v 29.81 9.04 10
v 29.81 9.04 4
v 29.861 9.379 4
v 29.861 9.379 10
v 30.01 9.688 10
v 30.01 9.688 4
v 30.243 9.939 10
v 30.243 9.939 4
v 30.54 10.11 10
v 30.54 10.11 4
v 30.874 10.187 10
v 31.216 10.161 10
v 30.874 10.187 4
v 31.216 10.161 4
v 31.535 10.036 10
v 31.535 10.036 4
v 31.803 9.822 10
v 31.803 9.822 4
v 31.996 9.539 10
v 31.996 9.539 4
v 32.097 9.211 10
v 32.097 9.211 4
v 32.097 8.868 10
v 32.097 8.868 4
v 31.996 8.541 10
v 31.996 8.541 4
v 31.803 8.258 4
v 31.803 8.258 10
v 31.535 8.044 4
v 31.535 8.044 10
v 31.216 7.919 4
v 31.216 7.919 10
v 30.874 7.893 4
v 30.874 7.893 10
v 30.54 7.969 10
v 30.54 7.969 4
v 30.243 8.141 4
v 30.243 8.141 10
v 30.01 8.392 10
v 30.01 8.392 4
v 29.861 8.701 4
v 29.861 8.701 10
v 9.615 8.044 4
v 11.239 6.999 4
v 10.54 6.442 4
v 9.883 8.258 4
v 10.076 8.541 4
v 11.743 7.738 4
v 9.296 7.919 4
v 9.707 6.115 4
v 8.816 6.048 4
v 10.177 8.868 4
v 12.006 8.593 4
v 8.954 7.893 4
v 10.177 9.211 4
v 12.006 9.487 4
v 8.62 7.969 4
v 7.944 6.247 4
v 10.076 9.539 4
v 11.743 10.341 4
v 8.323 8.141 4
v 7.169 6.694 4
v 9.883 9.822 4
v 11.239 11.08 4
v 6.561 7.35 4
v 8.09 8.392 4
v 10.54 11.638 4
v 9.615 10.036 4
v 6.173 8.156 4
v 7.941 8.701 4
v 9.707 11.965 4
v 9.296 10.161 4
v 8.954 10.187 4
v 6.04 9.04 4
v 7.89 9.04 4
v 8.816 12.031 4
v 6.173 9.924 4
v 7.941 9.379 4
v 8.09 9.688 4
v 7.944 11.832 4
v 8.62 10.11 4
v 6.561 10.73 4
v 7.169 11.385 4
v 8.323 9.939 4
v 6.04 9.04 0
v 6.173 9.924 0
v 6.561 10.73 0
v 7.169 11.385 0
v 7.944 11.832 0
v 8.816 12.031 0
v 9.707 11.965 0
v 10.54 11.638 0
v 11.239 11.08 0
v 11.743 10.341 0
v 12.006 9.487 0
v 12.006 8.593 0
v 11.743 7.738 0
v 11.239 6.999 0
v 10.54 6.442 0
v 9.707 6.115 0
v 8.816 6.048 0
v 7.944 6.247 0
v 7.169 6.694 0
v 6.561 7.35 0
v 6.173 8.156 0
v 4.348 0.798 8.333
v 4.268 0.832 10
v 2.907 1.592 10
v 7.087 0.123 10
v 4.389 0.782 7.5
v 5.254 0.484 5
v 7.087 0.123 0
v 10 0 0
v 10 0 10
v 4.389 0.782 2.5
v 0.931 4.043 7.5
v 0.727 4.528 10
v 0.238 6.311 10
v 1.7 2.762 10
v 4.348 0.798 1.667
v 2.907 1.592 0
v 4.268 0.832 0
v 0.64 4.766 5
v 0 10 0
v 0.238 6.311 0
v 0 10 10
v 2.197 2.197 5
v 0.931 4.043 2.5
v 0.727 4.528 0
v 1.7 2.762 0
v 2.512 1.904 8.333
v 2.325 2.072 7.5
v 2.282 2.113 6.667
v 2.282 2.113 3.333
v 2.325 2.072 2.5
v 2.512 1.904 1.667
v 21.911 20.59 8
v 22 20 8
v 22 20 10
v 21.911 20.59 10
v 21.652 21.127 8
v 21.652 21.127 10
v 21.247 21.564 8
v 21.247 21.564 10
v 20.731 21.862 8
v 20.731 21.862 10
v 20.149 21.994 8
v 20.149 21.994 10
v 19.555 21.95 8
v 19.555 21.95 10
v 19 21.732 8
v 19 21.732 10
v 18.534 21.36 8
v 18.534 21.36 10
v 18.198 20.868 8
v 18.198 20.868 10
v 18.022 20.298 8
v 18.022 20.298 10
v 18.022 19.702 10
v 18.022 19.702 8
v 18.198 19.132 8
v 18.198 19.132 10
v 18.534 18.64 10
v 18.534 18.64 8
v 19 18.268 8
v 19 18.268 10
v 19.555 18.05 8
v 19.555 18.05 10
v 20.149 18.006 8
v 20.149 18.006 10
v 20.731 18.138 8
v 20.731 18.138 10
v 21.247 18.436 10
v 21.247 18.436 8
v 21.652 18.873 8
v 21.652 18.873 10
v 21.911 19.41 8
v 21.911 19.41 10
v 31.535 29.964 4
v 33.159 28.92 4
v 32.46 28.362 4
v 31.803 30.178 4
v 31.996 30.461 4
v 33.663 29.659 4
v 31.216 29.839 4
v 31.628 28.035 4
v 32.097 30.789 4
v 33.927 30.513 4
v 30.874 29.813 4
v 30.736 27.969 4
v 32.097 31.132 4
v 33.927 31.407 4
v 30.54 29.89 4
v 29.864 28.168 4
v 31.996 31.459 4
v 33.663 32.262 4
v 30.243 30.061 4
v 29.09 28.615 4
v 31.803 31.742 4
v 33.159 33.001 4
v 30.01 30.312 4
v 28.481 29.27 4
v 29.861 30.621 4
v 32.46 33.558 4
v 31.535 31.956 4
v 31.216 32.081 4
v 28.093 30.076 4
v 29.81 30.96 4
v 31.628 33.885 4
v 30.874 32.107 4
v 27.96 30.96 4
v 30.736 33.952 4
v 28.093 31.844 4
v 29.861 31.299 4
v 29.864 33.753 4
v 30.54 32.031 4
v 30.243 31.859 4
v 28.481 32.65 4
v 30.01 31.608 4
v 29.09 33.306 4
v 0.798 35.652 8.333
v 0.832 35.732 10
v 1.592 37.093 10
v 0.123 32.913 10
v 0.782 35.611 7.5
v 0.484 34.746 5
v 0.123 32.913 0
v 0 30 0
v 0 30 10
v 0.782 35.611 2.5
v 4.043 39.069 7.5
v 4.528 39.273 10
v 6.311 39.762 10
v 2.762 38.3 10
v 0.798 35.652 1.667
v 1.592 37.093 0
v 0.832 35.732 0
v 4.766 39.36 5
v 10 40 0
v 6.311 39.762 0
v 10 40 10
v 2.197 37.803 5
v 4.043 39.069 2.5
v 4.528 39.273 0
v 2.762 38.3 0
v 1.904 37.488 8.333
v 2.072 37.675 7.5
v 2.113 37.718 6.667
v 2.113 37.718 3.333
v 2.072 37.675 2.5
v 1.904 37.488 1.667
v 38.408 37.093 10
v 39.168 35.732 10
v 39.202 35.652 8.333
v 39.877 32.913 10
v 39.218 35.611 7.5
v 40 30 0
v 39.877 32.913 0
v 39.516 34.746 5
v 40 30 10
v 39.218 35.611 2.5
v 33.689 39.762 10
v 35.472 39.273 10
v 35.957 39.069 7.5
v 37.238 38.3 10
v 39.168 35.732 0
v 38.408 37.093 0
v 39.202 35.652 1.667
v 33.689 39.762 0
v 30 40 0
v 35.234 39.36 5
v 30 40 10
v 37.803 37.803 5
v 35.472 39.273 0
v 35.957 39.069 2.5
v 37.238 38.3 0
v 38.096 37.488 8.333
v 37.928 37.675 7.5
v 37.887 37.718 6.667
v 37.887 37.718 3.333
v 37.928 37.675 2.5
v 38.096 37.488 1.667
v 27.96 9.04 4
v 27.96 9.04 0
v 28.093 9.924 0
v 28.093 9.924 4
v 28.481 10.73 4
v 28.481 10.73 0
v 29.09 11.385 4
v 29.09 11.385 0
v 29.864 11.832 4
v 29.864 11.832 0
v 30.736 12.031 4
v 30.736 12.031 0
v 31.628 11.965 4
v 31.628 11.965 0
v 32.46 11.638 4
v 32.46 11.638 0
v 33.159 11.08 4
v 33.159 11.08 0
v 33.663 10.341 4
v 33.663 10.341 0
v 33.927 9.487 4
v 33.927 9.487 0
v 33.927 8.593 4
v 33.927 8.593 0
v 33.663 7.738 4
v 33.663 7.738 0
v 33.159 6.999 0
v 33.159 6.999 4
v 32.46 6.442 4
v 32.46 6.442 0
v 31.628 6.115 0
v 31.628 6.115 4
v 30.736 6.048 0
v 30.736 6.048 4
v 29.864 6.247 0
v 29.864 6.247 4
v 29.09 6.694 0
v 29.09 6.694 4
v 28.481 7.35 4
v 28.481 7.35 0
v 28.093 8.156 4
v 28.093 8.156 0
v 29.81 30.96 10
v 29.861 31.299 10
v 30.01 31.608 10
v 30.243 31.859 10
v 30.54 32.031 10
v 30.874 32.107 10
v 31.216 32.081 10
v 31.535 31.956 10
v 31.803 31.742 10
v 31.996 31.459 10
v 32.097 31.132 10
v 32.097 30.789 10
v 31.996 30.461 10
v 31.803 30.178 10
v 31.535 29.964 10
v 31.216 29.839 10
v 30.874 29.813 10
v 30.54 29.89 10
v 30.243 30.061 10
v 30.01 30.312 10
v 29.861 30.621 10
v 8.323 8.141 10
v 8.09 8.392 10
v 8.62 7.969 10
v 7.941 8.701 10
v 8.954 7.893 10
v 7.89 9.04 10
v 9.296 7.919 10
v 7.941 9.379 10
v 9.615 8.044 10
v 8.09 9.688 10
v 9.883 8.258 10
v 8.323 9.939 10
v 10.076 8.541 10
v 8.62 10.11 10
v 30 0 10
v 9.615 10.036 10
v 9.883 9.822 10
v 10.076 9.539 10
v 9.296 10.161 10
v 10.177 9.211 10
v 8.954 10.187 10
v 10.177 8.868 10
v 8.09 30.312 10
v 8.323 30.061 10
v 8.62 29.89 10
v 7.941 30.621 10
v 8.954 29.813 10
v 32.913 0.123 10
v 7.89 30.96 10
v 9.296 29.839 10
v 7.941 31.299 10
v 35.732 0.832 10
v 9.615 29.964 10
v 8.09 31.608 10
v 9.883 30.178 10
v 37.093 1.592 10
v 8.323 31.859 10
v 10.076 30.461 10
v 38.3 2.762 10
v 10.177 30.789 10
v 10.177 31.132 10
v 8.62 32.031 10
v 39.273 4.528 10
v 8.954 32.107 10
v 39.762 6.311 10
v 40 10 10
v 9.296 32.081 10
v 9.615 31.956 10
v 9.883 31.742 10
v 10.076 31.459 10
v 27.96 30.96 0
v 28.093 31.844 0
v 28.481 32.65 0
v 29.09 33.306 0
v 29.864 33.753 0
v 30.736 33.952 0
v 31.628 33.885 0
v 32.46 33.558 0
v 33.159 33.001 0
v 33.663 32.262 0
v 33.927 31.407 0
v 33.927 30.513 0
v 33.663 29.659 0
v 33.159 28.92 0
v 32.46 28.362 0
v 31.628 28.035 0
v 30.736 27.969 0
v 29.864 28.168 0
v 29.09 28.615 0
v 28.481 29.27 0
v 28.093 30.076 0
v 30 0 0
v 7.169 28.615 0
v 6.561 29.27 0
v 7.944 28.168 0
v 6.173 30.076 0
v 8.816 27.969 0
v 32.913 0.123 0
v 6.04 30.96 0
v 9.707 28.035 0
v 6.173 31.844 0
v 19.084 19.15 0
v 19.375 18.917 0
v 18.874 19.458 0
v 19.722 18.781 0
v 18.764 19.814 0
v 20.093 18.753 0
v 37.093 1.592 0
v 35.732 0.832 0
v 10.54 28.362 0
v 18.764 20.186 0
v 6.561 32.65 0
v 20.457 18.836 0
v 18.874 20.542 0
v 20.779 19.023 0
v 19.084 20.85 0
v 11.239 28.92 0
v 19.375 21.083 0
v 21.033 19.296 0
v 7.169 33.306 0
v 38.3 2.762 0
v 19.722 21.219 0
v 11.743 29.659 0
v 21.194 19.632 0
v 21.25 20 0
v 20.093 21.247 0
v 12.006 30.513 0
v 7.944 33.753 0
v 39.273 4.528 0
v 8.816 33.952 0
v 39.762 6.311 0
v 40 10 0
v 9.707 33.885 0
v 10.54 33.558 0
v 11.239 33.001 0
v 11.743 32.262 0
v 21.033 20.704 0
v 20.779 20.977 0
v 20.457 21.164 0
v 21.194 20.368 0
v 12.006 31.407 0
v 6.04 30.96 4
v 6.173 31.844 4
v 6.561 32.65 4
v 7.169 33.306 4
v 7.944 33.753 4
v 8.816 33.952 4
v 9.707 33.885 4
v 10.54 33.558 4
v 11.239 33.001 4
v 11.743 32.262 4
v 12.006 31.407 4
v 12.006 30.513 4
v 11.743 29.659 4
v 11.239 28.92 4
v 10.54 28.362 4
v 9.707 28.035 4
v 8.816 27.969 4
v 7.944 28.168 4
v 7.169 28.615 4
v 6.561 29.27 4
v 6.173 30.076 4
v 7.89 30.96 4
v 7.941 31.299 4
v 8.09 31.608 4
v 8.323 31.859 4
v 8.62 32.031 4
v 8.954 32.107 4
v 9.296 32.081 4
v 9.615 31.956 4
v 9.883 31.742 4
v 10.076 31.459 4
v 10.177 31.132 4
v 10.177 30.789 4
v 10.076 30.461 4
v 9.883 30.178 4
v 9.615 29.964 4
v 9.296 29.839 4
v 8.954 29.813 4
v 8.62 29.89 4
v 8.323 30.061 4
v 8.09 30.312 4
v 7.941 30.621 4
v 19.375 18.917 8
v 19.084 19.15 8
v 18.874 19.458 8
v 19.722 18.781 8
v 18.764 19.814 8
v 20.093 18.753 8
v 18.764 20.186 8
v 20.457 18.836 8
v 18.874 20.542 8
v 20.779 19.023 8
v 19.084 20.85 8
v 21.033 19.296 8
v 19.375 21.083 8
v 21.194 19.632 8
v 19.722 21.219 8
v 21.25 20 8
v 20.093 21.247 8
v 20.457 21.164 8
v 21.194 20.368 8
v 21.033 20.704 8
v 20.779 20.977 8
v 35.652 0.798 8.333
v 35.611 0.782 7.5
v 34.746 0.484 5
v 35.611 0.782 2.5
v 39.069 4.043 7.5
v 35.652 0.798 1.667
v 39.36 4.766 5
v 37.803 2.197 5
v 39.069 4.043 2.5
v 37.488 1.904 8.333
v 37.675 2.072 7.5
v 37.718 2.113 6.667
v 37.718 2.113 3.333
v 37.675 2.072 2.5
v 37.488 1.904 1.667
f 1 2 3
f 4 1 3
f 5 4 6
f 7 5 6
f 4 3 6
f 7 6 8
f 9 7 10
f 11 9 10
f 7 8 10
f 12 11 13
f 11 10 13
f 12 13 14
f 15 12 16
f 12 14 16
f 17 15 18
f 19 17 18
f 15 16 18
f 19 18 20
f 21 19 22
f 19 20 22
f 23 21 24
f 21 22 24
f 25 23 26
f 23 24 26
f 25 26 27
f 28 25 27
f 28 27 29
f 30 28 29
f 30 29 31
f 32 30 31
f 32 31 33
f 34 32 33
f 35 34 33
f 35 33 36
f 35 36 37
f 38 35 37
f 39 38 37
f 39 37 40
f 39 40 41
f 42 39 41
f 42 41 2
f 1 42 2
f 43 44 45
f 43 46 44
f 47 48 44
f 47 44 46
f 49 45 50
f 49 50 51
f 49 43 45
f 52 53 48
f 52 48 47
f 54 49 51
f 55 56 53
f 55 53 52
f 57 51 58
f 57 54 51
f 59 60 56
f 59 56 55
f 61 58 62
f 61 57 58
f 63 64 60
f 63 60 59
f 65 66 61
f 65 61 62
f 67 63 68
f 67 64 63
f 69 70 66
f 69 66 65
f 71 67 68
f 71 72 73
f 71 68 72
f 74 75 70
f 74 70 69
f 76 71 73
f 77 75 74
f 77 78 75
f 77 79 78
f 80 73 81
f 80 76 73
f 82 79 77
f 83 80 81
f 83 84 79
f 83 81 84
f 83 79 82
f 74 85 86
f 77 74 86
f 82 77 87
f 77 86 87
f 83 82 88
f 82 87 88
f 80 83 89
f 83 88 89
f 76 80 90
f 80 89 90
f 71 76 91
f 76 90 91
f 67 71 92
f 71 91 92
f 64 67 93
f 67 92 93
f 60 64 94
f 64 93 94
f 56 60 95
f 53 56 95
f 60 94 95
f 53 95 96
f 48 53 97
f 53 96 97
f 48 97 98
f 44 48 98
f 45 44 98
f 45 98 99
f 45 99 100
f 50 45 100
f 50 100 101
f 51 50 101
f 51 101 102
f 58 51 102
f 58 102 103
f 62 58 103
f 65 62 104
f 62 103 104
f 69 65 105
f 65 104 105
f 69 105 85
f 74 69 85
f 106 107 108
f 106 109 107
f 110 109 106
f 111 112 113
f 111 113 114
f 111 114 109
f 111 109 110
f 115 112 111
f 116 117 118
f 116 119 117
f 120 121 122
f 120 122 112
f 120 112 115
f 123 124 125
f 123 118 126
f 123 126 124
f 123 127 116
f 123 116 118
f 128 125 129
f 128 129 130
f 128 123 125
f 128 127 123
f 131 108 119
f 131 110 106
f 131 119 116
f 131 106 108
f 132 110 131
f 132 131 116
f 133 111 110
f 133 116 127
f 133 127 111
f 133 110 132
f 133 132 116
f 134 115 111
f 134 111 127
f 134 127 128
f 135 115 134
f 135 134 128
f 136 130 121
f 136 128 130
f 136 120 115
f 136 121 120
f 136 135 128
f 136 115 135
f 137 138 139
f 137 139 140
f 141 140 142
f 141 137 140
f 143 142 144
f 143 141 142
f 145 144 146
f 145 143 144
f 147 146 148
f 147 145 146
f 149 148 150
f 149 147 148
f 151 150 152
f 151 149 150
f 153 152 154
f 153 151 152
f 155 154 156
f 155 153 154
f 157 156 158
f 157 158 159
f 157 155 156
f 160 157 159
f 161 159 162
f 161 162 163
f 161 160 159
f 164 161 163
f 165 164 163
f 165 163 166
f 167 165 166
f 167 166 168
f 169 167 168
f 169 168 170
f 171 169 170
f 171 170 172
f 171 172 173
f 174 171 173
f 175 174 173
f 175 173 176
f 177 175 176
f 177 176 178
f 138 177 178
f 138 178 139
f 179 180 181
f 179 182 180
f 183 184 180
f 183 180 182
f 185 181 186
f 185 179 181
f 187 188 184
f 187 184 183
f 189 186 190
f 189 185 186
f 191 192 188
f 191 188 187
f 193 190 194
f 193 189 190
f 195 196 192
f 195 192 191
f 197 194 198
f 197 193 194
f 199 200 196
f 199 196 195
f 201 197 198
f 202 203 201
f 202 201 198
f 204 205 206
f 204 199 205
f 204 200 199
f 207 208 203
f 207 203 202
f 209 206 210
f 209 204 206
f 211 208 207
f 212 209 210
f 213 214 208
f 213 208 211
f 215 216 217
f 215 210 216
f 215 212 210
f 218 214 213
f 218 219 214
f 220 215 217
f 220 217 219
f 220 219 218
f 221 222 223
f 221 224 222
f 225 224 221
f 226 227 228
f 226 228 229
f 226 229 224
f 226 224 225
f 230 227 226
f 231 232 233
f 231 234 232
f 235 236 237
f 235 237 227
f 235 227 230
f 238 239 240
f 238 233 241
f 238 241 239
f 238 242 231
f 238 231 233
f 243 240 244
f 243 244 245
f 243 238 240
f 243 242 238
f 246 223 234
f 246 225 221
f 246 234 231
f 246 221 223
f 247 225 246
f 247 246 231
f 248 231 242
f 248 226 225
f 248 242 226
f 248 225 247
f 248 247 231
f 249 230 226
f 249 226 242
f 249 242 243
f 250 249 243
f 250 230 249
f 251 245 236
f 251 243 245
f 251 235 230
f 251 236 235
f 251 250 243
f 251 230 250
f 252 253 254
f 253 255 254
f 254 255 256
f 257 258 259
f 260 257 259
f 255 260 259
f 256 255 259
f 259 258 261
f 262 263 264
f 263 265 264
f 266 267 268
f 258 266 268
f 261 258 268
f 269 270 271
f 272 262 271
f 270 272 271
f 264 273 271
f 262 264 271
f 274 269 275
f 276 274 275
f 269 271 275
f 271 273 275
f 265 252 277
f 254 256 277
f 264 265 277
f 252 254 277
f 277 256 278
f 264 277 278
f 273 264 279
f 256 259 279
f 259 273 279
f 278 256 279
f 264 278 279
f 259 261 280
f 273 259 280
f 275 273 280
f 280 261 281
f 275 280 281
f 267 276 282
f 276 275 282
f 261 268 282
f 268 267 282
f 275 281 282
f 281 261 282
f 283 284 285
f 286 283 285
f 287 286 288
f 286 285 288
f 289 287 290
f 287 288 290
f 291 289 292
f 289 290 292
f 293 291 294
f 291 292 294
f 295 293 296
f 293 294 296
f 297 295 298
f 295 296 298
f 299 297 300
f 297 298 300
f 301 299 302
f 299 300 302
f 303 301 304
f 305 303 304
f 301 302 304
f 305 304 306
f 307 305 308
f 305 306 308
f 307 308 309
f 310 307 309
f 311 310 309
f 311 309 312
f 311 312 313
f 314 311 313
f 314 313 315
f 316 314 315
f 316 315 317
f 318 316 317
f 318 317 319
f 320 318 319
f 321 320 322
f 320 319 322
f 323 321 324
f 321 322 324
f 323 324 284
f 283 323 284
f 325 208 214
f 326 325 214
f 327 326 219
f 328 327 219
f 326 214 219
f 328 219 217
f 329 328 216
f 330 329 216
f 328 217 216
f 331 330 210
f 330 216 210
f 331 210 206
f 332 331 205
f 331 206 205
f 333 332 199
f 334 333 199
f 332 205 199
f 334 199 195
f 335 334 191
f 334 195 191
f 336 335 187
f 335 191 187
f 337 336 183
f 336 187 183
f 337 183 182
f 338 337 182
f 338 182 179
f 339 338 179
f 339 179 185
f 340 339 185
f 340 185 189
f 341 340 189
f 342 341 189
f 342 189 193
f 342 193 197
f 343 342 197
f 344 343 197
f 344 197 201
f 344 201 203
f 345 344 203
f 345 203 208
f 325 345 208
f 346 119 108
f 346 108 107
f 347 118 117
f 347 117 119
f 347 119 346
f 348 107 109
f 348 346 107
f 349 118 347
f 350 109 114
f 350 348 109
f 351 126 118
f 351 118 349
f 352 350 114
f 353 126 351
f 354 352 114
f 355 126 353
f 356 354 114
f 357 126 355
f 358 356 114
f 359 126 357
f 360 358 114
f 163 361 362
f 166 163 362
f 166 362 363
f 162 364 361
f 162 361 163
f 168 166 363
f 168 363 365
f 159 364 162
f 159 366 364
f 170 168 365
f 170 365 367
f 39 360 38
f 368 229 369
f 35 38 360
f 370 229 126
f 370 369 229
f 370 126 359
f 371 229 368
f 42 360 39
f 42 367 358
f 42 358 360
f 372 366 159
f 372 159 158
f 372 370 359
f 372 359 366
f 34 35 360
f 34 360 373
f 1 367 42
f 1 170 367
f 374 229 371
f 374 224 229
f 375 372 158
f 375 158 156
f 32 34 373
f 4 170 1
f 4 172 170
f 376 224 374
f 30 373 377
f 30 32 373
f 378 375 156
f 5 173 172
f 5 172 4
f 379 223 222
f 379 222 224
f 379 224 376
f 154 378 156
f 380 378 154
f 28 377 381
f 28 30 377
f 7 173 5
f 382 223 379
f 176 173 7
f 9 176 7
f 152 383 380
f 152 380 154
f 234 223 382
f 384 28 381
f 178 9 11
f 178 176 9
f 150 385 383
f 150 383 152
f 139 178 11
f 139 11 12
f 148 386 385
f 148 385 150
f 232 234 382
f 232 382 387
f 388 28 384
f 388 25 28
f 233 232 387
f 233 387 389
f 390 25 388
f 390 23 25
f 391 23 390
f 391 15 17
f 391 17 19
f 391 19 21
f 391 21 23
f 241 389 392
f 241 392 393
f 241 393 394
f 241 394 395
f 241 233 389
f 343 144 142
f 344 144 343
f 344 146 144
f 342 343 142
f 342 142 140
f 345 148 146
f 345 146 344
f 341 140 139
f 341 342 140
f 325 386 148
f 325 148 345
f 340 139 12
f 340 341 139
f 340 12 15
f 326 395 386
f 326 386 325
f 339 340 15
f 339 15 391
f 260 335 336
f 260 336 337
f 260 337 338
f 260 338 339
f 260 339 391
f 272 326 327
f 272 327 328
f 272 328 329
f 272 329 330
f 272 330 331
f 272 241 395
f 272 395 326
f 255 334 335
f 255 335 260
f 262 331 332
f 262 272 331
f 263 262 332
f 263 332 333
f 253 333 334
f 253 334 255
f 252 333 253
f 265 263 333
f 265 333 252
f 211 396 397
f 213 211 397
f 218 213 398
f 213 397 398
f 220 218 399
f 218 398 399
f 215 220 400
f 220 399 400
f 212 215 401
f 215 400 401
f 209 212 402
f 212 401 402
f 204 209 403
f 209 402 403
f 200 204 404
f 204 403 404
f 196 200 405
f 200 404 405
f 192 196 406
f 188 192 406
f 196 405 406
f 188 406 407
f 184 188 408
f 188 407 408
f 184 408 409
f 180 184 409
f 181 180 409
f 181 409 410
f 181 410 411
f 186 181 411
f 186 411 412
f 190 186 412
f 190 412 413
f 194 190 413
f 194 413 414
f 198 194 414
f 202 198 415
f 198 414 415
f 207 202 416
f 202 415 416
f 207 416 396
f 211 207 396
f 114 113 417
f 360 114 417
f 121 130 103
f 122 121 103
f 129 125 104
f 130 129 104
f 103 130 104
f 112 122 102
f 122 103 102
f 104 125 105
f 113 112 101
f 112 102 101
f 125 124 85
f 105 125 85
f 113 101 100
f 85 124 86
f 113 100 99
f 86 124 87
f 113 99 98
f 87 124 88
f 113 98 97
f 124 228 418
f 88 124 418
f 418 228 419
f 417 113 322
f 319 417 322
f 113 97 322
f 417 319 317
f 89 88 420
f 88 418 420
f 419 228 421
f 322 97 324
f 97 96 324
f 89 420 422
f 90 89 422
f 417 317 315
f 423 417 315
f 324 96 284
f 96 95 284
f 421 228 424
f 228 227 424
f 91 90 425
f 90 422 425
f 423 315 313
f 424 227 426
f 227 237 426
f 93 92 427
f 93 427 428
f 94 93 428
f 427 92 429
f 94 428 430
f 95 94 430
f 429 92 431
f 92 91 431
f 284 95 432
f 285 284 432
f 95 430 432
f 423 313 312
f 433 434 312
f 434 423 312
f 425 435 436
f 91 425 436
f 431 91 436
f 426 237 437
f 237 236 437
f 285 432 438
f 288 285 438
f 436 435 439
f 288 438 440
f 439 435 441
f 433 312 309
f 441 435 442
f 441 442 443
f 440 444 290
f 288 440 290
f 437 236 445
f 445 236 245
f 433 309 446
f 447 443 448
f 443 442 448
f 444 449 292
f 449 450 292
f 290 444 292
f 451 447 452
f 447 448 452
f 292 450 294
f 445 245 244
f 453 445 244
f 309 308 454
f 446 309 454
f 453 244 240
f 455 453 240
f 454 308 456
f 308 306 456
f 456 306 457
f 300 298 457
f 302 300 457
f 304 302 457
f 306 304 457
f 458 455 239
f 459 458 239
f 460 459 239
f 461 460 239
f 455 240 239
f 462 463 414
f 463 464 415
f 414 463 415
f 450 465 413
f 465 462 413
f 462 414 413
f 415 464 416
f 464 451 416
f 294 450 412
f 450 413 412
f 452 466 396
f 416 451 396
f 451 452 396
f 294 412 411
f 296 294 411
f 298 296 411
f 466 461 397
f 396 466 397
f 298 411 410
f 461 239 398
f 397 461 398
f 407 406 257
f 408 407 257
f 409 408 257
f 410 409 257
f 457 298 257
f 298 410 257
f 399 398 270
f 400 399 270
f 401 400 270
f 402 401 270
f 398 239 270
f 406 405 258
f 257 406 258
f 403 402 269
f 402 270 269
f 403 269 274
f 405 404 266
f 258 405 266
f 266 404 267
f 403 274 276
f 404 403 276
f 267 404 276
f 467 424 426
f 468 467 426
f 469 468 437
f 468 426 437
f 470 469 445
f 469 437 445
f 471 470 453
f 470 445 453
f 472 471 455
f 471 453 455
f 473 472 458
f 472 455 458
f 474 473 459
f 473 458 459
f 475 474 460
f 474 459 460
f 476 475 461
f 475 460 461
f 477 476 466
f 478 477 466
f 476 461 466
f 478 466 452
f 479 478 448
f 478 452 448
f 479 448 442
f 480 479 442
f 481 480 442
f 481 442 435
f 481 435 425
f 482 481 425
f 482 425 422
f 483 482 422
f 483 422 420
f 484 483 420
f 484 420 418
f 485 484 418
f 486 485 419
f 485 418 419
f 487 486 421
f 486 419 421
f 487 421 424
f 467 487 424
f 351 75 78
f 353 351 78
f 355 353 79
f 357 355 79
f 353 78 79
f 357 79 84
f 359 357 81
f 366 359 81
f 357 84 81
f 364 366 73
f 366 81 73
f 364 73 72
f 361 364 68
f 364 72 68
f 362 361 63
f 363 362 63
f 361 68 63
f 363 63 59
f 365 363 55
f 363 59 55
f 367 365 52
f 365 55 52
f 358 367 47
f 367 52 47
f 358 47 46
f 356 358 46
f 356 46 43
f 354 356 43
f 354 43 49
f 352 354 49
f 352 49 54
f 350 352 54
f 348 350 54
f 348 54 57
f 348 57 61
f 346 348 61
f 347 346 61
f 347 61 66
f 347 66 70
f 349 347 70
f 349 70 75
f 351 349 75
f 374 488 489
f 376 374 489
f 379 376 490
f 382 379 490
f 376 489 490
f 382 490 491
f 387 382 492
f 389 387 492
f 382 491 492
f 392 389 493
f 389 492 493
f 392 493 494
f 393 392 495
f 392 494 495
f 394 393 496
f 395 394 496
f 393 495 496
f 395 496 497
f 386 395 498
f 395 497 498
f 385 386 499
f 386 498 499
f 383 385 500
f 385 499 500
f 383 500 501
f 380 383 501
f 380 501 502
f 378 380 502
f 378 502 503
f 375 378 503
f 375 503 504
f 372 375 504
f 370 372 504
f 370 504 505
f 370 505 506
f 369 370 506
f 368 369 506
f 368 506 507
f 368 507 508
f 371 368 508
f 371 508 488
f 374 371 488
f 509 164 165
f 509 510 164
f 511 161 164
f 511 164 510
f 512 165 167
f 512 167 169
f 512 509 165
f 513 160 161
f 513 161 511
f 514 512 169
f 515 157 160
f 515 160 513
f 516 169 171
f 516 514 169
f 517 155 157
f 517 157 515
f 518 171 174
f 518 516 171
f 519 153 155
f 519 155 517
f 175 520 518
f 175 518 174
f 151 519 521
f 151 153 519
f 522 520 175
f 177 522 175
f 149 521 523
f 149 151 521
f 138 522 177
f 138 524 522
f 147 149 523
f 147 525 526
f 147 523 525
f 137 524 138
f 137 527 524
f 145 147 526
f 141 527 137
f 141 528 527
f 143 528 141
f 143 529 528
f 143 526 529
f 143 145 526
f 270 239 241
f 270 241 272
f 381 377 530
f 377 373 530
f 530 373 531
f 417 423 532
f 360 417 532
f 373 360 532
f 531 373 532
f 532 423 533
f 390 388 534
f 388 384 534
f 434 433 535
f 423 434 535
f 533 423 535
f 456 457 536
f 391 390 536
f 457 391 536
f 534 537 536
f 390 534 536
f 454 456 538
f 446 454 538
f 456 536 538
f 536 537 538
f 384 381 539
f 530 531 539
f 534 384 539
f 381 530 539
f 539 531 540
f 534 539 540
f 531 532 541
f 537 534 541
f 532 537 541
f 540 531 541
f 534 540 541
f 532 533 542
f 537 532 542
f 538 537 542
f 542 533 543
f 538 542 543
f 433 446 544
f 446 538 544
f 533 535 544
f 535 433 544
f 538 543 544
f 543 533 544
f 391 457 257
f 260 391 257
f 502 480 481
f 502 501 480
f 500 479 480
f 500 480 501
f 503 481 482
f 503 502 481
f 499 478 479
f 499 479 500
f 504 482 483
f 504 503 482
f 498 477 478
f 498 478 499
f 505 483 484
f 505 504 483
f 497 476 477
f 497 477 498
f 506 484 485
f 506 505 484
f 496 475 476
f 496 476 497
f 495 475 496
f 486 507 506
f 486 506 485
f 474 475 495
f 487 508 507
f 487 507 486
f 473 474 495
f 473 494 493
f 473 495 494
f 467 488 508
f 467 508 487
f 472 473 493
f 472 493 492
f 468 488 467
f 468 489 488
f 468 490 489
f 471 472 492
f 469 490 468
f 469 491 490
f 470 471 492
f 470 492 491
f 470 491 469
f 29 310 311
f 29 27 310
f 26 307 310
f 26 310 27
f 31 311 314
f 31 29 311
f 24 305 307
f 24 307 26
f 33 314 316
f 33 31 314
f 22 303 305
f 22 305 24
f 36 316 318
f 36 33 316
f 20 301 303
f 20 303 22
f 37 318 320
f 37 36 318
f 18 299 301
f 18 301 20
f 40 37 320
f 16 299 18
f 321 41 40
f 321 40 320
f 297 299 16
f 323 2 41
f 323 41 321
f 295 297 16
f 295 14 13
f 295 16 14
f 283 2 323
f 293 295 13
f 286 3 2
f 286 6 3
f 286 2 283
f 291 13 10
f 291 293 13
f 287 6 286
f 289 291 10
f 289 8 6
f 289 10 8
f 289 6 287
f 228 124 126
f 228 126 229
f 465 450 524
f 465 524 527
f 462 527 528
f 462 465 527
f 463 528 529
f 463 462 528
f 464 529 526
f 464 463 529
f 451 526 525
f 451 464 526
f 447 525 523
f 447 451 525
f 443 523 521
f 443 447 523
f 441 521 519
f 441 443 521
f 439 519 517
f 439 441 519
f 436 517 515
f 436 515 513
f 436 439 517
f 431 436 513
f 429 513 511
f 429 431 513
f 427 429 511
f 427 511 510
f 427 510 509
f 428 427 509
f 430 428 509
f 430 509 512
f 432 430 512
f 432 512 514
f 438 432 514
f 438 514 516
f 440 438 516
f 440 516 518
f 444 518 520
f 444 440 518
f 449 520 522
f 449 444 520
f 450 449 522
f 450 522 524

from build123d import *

# Parameters (mm, degrees)
ESQUISSE1_W             = 40
ESQUISSE1_H             = 40
ESQUISSE1_R             = 2
BOSS_EXTRU_1_DEPTH      = 10
ESQUISSE1_3_R           = 2
ESQUISSE1_3_R_2         = 1.25
BOSS_EXTRU_2_DEPTH      = 8
ENL_V_MAT_EXTRU_1_REACH = 59.446
ESQUISSE2_R             = 1.15
ESQUISSE2_5_R           = 3
ESQUISSE2_5_R_2         = 1.15
ENL_V_MAT_EXTRU_2_DEPTH = 4
CONG_1_SIZE             = 10


with BuildPart() as part:
    # Esquisse1 → Boss.-Extru.1 (new body)
    with BuildSketch(Plane.XY):
        with Locations((20, 20)):
            Rectangle(ESQUISSE1_W, ESQUISSE1_H)
        with Locations((20, 20)):
            Circle(ESQUISSE1_R, mode=Mode.SUBTRACT)
    extrude(amount=BOSS_EXTRU_1_DEPTH)

    # Esquisse1<3> → Boss.-Extru.2 (add)
    with BuildSketch(Plane.XY):
        with Locations((20, 20)):
            Circle(ESQUISSE1_3_R)
        with Locations((20, 20)):
            Circle(ESQUISSE1_3_R_2, mode=Mode.SUBTRACT)
    extrude(amount=BOSS_EXTRU_2_DEPTH)

    # Esquisse2 → Enlèv. mat.-Extru.1 (cut, up to next)
    with BuildSketch(Plane(origin=(0, 0, 0), x_dir=(-1, 0, 0), z_dir=(0, 0, -1)), mode=Mode.PRIVATE) as enl_v_mat_extru_1_sk1:
        with Locations((-9.039844892, 30.960155108)):
            Circle(ESQUISSE2_R)
    enl_v_mat_extru_1_tool1 = extrude(enl_v_mat_extru_1_sk1.sketch, amount=-ENL_V_MAT_EXTRU_1_REACH, mode=Mode.PRIVATE) & part.part
    # Esquisse2 → Enlèv. mat.-Extru.1 (cut, up to next)
    with BuildSketch(Plane(origin=(0, 0, 0), x_dir=(-1, 0, 0), z_dir=(0, 0, -1)), mode=Mode.PRIVATE) as enl_v_mat_extru_1_sk2:
        with Locations((-9.039844892, 9.039844892)):
            Circle(ESQUISSE2_R)
    enl_v_mat_extru_1_tool2 = extrude(enl_v_mat_extru_1_sk2.sketch, amount=-ENL_V_MAT_EXTRU_1_REACH, mode=Mode.PRIVATE) & part.part
    # Esquisse2 → Enlèv. mat.-Extru.1 (cut, up to next)
    with BuildSketch(Plane(origin=(0, 0, 0), x_dir=(-1, 0, 0), z_dir=(0, 0, -1)), mode=Mode.PRIVATE) as enl_v_mat_extru_1_sk3:
        with Locations((-30.960155108, 9.039844892)):
            Circle(ESQUISSE2_R)
    enl_v_mat_extru_1_tool3 = extrude(enl_v_mat_extru_1_sk3.sketch, amount=-ENL_V_MAT_EXTRU_1_REACH, mode=Mode.PRIVATE) & part.part
    # Esquisse2 → Enlèv. mat.-Extru.1 (cut, up to next)
    with BuildSketch(Plane(origin=(0, 0, 0), x_dir=(-1, 0, 0), z_dir=(0, 0, -1)), mode=Mode.PRIVATE) as enl_v_mat_extru_1_sk4:
        with Locations((-30.960155108, 30.960155108)):
            Circle(ESQUISSE2_R)
    enl_v_mat_extru_1_tool4 = extrude(enl_v_mat_extru_1_sk4.sketch, amount=-ENL_V_MAT_EXTRU_1_REACH, mode=Mode.PRIVATE) & part.part
    add(enl_v_mat_extru_1_tool1.solids().sort_by_distance((9.039845, 30.960155, 0))[0], mode=Mode.SUBTRACT)
    add(enl_v_mat_extru_1_tool2.solids().sort_by_distance((9.039845, 9.039845, 0))[0], mode=Mode.SUBTRACT)
    add(enl_v_mat_extru_1_tool3.solids().sort_by_distance((30.960155, 9.039845, 0))[0], mode=Mode.SUBTRACT)
    add(enl_v_mat_extru_1_tool4.solids().sort_by_distance((30.960155, 30.960155, 0))[0], mode=Mode.SUBTRACT)

    # Esquisse2<5> → Enlèv. mat.-Extru.2 (cut)
    # profile 1 of 4: a face of its own
    with BuildSketch(Plane(origin=(0, 0, 0), x_dir=(-1, 0, 0), z_dir=(0, 0, -1))):
        with Locations((-9.039844892, 30.960155108)):
            Circle(ESQUISSE2_5_R)
        with Locations((-9.039844892, 30.960155108)):
            Circle(ESQUISSE2_5_R_2, mode=Mode.SUBTRACT)
    # profile 2 of 4: a face of its own
    with BuildSketch(Plane(origin=(0, 0, 0), x_dir=(-1, 0, 0), z_dir=(0, 0, -1))):
        with Locations((-9.039844892, 9.039844892)):
            Circle(ESQUISSE2_5_R)
        with Locations((-9.039844892, 9.039844892)):
            Circle(ESQUISSE2_5_R_2, mode=Mode.SUBTRACT)
    # profile 3 of 4: a face of its own
    with BuildSketch(Plane(origin=(0, 0, 0), x_dir=(-1, 0, 0), z_dir=(0, 0, -1))):
        with Locations((-30.960155108, 9.039844892)):
            Circle(ESQUISSE2_5_R)
        with Locations((-30.960155108, 9.039844892)):
            Circle(ESQUISSE2_5_R_2, mode=Mode.SUBTRACT)
    # profile 4 of 4: a face of its own
    with BuildSketch(Plane(origin=(0, 0, 0), x_dir=(-1, 0, 0), z_dir=(0, 0, -1))):
        with Locations((-30.960155108, 30.960155108)):
            Circle(ESQUISSE2_5_R)
        with Locations((-30.960155108, 30.960155108)):
            Circle(ESQUISSE2_5_R_2, mode=Mode.SUBTRACT)
    extrude(amount=-ENL_V_MAT_EXTRU_2_DEPTH, mode=Mode.SUBTRACT)

    # Congé1
    # a fillet whose section is not a circle: 10 mm, written as the material it takes off along each edge
    with BuildSketch(Plane(origin=(0, 0, -25), x_dir=(1, 0, 0), z_dir=(0, 0, 1)), Plane(origin=(0, 40, -25), x_dir=(0, -1, 0), z_dir=(0, 0, 1))) as cong_1_piece_1:
        with BuildLine():
            add(Edge.make_bspline([(CONG_1_SIZE, 0), (CONG_1_SIZE * 0.831801948466, 0), (CONG_1_SIZE * 0.663603896932, 0), (CONG_1_SIZE * 0.292893218813, CONG_1_SIZE * 0.0716919198361), (CONG_1_SIZE * 0.0716919198361, CONG_1_SIZE * 0.292893218813), (0, CONG_1_SIZE * 0.663603896932), (0, CONG_1_SIZE * 0.831801948466), (0, CONG_1_SIZE)], knots=[0, 0, 0, 0, 0, 0, 0.5, 0.5, 1, 1, 1, 1, 1, 1], degree=5))
            Line((0, CONG_1_SIZE), (0, 0))
            Line((0, 0), (CONG_1_SIZE, 0))
        make_face()
    extrude(amount=60, mode=Mode.SUBTRACT)
    with BuildSketch(Plane(origin=(40, 40, -25), x_dir=(0, -1, 0), z_dir=(0, 0, 1)), Plane(origin=(40, 0, -25), x_dir=(-1, 0, 0), z_dir=(0, 0, 1))) as cong_1_piece_2:
        with BuildLine():
            add(Edge.make_bspline([(CONG_1_SIZE, 0), (CONG_1_SIZE * 0.831801948466, 0), (CONG_1_SIZE * 0.663603896932, 0), (CONG_1_SIZE * 0.292893218813, -CONG_1_SIZE * 0.0716919198361), (CONG_1_SIZE * 0.0716919198361, -CONG_1_SIZE * 0.292893218813), (0, -CONG_1_SIZE * 0.663603896932), (0, -CONG_1_SIZE * 0.831801948466), (0, -CONG_1_SIZE)], knots=[0, 0, 0, 0, 0, 0, 0.5, 0.5, 1, 1, 1, 1, 1, 1], degree=5))
            Line((0, -CONG_1_SIZE), (0, 0))
            Line((0, 0), (CONG_1_SIZE, 0))
        make_face()
    extrude(amount=60, mode=Mode.SUBTRACT)


solid = part.part
